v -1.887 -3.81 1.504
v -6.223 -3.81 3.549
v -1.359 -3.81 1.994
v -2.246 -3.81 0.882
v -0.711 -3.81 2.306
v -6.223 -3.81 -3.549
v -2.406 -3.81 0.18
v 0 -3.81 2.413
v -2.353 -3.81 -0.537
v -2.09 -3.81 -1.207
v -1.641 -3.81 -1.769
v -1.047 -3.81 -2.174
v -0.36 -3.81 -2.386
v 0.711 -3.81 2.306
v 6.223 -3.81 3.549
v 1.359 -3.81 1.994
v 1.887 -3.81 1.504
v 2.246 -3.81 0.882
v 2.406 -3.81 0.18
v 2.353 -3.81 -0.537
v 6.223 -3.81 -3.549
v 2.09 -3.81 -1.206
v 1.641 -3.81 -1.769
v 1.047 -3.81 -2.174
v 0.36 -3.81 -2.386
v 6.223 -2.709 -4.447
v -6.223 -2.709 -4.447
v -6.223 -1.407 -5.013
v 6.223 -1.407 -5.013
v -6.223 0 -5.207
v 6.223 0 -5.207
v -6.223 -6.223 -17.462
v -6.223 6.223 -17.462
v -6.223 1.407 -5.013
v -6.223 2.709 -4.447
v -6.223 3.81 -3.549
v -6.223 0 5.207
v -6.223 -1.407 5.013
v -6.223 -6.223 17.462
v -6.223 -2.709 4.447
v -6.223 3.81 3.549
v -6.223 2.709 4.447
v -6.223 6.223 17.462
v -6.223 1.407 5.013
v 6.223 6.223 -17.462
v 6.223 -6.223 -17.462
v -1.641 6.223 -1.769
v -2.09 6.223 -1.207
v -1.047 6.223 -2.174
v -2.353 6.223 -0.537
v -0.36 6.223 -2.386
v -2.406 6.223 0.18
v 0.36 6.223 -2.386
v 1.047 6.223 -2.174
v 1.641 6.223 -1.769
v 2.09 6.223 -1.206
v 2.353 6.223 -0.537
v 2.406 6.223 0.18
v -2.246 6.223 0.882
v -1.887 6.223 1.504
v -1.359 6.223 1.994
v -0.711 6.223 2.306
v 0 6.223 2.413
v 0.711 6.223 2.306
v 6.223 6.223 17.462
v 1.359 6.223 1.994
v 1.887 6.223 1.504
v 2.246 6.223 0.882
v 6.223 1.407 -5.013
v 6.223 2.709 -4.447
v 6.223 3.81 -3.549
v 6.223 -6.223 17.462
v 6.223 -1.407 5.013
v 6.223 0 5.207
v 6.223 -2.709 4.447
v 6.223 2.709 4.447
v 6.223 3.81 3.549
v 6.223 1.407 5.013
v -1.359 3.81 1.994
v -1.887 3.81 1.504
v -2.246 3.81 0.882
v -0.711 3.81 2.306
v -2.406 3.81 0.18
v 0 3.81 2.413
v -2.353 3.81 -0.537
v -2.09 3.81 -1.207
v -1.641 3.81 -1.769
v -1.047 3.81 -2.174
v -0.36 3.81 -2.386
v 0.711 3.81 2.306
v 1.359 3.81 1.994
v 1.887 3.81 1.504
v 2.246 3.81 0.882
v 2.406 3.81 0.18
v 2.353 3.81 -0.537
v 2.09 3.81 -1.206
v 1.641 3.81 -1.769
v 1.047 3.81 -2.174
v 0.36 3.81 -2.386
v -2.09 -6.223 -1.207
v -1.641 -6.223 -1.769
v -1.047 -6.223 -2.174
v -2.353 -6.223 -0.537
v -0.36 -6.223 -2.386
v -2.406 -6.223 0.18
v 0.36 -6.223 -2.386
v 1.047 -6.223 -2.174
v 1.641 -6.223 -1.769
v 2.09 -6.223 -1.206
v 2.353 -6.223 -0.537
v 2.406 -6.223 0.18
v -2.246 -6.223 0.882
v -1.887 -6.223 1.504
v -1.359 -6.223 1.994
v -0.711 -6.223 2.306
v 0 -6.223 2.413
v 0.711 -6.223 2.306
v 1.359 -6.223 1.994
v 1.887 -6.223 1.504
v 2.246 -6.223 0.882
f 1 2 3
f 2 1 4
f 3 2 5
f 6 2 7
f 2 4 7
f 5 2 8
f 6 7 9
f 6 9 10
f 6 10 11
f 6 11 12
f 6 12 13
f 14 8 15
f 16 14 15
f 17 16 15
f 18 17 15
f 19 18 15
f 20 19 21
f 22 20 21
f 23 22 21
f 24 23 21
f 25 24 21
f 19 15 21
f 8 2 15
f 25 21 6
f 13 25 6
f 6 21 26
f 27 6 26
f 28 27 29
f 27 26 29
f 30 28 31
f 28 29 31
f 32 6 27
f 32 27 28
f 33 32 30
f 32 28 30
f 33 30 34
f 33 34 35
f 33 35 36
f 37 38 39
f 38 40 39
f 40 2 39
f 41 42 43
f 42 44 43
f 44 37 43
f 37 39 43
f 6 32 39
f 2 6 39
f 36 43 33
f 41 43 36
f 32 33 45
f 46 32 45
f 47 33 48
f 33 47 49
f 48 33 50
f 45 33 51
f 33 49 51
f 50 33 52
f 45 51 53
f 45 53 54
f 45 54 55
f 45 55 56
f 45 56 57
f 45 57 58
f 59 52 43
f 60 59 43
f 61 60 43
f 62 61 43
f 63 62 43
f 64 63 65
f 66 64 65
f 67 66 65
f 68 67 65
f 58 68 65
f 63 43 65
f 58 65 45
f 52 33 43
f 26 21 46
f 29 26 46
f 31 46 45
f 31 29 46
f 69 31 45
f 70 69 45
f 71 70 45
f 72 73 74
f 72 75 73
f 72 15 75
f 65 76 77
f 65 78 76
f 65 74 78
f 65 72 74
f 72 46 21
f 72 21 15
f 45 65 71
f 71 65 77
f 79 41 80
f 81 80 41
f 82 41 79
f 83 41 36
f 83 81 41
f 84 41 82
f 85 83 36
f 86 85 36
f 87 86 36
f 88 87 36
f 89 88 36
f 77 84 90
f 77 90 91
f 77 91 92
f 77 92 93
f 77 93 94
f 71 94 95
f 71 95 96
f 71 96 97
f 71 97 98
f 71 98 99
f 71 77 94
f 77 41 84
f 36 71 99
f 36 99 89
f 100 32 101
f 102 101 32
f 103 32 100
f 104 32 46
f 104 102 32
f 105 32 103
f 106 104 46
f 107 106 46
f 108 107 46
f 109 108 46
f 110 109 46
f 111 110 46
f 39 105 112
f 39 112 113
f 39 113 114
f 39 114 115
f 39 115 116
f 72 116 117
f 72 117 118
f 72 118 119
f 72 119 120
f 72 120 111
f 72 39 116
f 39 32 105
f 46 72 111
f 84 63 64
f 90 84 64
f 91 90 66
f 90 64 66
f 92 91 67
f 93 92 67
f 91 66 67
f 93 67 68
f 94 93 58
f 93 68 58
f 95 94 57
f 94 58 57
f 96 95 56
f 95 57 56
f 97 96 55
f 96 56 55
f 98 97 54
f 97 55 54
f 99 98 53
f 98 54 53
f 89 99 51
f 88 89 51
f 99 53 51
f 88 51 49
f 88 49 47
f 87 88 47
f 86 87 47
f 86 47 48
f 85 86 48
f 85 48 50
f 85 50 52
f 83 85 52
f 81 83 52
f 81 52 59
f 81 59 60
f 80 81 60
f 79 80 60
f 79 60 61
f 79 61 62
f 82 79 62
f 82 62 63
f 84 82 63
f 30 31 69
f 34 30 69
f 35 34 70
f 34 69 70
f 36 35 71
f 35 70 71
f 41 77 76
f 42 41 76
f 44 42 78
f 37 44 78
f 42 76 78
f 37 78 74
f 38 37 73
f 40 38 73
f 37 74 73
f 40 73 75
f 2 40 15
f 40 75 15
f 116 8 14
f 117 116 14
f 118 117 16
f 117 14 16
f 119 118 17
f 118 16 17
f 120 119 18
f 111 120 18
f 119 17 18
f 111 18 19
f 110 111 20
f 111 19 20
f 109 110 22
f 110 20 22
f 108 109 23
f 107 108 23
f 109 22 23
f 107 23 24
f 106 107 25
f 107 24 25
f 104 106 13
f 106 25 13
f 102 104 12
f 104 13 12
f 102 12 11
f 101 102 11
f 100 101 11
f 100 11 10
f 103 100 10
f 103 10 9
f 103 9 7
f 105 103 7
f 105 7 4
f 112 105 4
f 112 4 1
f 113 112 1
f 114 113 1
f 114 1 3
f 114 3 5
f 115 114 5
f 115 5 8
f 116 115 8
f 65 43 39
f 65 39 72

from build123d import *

# Parameters (mm, degrees)
SKETCH1_W           = 12.446
SKETCH1_H           = 12.446
BOSS_EXTRUDE1_DEPTH = 17.4625
SKETCH2_W           = 7.098379816
SKETCH2_H           = 7.62
CUT_EXTRUDE1_DEPTH  = 23.328626273
SKETCH3_R           = 2.413
CUT_EXTRUDE2_DEPTH  = 23.328626273


with BuildPart() as part:
    # Sketch1 → Boss-Extrude1 (new, symmetric)
    with BuildSketch(Plane.XY):
        Rectangle(SKETCH1_W, SKETCH1_H)
    extrude(amount=BOSS_EXTRUDE1_DEPTH, both=True)

    # Sketch2 → Cut-Extrude1 (cut, through all)
    with BuildSketch(Plane(origin=(6.223, 0, 0), x_dir=(0, 0, -1), z_dir=(1, 0, 0))):
        with BuildLine():
            ThreePointArc((-3.549189908, 3.81), (-5.207, 0), (-3.549189908, -3.81))
            Line((-3.549189908, -3.81), (-3.549189908, 3.81))
        make_face()
        Rectangle(SKETCH2_W, SKETCH2_H)
        with BuildLine():
            Line((3.549189908, 3.81), (3.549189908, -3.81))
            ThreePointArc((3.549189908, -3.81), (4.774593221, -2.077524627), (5.207, 0))
            ThreePointArc((5.207, 0), (4.774593221, 2.077524627), (3.549189908, 3.81))
        make_face()
    extrude(amount=-CUT_EXTRUDE1_DEPTH, mode=Mode.SUBTRACT)

    # Sketch3 → Cut-Extrude2 (cut, through all)
    with BuildSketch(Plane(origin=(0, 6.223, 0), x_dir=(1, 0, 0), z_dir=(0, 1, 0))):
        with Locations(Location((0, 0, 0), (0, 0, 270))):
            Circle(SKETCH3_R)
    extrude(amount=-CUT_EXTRUDE2_DEPTH, mode=Mode.SUBTRACT)


solid = part.part
